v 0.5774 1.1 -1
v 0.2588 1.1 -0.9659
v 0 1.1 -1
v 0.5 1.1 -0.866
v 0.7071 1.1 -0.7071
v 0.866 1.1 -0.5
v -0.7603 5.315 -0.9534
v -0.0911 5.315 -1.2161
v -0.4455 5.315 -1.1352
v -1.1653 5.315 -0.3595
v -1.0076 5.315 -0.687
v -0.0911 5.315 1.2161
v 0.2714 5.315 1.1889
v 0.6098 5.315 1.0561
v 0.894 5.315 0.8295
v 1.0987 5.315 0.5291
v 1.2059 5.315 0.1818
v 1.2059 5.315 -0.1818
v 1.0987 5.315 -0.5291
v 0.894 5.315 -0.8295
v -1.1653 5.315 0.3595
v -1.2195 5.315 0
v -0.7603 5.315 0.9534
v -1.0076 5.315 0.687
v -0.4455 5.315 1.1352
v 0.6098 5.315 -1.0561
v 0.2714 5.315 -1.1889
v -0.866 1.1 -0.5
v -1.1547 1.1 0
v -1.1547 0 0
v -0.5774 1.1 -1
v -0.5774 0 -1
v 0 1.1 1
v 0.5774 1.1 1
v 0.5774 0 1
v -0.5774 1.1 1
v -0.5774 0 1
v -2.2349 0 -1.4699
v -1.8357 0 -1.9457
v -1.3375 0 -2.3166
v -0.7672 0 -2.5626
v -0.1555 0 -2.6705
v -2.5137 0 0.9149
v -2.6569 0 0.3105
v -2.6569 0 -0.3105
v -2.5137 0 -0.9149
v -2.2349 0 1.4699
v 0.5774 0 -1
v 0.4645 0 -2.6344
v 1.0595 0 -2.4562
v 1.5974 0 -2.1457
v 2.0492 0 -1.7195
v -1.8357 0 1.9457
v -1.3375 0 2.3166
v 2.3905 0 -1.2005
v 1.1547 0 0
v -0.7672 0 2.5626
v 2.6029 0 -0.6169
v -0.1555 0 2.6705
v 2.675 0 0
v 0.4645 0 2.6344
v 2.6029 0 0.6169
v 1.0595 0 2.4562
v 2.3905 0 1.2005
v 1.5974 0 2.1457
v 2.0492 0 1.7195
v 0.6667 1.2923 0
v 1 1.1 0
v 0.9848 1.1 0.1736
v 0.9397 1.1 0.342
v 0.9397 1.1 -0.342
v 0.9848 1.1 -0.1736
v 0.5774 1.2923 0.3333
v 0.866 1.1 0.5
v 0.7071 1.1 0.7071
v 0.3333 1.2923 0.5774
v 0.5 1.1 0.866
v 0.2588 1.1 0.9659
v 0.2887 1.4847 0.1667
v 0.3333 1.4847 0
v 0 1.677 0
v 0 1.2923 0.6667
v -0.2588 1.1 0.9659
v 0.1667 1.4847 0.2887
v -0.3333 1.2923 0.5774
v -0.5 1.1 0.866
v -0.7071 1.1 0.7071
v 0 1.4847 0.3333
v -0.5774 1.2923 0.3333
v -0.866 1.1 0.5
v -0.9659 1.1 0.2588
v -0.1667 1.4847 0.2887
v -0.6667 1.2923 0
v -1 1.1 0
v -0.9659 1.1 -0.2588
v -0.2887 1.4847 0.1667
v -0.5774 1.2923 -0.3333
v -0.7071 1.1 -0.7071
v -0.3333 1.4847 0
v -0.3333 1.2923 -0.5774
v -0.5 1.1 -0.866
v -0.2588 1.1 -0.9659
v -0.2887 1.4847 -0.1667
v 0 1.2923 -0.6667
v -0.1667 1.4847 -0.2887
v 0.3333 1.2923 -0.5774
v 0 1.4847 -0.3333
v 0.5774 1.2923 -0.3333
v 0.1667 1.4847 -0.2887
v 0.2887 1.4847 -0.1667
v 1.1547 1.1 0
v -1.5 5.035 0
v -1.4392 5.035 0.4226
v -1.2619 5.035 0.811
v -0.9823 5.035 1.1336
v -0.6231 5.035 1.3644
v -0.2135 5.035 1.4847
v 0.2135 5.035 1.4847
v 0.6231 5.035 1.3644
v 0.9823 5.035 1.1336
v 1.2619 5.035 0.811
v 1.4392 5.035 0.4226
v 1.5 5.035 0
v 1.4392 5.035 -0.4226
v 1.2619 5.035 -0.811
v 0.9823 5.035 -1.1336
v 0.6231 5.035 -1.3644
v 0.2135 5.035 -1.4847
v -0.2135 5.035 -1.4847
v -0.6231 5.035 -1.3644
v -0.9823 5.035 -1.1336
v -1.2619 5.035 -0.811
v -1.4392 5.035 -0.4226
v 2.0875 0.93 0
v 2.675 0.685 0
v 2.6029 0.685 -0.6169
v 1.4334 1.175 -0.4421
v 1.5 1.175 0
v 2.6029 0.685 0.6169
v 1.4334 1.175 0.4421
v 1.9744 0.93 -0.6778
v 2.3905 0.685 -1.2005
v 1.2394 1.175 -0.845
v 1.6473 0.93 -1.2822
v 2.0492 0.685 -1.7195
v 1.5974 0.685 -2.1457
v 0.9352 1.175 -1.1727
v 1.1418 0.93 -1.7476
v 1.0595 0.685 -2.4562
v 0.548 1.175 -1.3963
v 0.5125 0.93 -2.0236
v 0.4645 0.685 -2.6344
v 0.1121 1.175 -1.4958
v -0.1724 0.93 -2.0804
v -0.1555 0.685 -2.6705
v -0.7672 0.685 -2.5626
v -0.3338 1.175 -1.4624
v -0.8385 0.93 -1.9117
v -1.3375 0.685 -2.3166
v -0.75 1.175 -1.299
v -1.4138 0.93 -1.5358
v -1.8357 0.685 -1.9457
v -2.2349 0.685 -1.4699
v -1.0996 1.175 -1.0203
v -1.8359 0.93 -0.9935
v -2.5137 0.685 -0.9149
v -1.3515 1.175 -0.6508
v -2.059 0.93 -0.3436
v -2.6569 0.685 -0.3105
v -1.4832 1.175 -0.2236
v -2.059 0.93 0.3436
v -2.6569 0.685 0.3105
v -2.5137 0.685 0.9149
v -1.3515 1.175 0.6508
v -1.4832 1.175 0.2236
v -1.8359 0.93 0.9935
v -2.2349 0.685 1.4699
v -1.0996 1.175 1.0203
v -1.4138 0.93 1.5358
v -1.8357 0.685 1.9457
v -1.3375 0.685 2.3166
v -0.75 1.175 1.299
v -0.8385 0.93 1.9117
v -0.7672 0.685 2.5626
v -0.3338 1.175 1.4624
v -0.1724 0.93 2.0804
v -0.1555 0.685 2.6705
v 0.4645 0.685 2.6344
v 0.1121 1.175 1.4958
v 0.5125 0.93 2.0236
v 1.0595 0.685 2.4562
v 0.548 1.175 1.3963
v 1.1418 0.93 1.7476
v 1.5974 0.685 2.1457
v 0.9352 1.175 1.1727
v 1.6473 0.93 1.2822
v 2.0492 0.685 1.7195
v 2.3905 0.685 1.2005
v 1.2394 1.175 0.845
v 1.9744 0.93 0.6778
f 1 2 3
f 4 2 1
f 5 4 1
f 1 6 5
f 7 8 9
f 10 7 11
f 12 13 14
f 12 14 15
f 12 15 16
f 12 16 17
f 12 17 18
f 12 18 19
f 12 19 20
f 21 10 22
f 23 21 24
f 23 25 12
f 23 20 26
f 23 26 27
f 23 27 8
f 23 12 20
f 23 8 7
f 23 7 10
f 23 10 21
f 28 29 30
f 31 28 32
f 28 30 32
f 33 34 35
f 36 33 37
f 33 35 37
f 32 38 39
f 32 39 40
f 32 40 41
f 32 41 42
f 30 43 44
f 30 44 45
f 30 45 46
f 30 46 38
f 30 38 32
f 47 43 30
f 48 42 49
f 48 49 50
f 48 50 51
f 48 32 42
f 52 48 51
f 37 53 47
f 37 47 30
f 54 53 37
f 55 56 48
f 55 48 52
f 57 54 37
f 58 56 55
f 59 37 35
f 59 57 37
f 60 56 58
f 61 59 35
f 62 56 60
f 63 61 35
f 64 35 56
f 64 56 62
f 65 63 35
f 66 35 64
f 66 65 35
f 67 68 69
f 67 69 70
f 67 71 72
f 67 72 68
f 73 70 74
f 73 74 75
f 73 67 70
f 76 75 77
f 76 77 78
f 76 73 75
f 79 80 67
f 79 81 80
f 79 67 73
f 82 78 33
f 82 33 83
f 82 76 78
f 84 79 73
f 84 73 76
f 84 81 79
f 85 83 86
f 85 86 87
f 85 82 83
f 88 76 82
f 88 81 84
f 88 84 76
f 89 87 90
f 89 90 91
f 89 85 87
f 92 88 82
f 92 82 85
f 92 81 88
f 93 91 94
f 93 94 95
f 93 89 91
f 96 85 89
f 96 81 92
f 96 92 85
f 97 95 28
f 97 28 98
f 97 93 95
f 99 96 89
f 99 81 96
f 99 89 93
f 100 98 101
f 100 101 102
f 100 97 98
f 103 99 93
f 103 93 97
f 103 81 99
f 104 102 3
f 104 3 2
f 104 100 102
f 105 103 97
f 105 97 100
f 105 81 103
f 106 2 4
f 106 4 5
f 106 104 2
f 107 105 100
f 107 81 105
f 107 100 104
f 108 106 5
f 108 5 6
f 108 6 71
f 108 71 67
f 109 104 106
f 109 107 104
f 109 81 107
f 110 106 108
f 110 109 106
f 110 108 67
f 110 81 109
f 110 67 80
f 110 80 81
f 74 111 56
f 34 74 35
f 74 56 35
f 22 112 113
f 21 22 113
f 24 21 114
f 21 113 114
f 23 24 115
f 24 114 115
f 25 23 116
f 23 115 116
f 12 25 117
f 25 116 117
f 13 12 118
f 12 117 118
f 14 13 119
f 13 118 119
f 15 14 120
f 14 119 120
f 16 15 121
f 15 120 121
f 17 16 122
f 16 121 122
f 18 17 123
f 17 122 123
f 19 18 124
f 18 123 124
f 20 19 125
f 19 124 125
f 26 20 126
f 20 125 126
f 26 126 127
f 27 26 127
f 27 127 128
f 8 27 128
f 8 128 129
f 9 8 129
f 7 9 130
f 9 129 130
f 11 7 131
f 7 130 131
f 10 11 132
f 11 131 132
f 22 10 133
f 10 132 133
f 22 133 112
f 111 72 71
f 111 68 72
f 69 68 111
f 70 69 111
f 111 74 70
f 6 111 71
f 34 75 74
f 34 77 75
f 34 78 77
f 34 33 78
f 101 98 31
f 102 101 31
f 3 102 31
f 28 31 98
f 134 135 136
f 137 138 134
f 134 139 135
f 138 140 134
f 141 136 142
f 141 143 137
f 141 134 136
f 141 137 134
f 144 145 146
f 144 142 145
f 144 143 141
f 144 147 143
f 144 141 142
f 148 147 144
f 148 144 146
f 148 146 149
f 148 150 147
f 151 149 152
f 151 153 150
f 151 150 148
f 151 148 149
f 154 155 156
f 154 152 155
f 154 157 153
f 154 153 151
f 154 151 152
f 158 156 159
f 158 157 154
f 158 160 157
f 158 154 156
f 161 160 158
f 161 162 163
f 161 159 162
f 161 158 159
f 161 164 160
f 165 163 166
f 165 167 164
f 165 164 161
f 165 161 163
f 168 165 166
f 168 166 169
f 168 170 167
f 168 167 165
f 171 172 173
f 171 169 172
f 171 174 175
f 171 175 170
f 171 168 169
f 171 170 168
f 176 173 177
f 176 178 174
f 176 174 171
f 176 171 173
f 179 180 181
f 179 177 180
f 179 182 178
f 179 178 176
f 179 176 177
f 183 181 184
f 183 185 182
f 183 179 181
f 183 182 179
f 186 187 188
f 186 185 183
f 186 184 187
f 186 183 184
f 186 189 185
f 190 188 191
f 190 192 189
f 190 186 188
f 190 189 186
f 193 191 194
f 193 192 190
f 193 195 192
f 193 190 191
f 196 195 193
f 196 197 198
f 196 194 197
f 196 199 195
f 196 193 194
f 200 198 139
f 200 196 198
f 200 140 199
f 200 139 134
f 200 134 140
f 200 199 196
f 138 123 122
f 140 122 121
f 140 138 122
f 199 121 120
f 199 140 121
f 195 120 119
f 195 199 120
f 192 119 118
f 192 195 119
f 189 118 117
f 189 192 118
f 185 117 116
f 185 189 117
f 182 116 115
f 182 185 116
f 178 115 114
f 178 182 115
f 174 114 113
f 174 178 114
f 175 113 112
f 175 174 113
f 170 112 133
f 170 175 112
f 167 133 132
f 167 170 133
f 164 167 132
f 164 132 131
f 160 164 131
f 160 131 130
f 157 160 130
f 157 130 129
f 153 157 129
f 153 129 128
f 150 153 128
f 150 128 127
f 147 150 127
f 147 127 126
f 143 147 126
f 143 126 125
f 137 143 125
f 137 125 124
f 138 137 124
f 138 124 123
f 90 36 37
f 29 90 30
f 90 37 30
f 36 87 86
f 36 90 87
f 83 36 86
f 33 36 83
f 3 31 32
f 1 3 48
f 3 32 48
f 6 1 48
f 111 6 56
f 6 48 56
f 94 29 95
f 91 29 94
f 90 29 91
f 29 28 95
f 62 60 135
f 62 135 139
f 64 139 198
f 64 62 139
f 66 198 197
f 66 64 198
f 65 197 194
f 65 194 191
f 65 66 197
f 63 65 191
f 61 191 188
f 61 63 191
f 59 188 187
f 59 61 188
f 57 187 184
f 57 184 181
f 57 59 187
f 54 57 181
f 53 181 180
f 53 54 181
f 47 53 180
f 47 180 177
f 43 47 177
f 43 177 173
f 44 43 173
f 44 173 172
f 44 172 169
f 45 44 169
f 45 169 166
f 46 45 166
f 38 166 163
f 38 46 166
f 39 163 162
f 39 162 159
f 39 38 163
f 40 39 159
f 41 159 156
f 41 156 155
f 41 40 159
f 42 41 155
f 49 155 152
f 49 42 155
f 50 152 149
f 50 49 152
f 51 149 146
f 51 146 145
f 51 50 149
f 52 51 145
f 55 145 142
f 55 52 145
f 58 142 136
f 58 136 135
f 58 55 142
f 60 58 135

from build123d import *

# Parameters (mm, degrees)
F0_R      = 2.675
F1_DEPTH  = 0.685
F1_FACE_R = 2.675
F3_R      = 1.5
F5_DEPTH  = 3.86
F7_R      = 1.2195
F5_FACE_R = 1.5
F9_DEPTH  = 1.1
F11_R     = 1


with BuildPart() as f1:
    # F0 (on Front) → F1 (new body)
    with BuildSketch(Plane.XZ):
        Circle(F0_R)
        Polygon((-1.1547005384, 0), (-0.5773502692, 1), (0.5773502692, 1), (1.1547005384, 0), (0.5773502692, -1), (-0.5773502692, -1), align=None, mode=Mode.SUBTRACT)
        Polygon((0.5773502692, 1), (-0.5773502692, 1), (-1.1547005384, 0), (-0.5773502692, -1), (0.5773502692, -1), (1.1547005384, 0), align=None)
    extrude(amount=-F1_DEPTH)

    # F1_face (on face) → F4 section 0
    with BuildSketch(Plane(origin=(0, 0.685, 0), x_dir=(1, 0, 0), z_dir=(0, 1, 0))):
        Circle(F1_FACE_R)
    # F3 (on offset) → F4 section 1
    with BuildSketch(Plane.XZ.offset(-1.175)):
        Circle(F3_R)
    loft()

    # F5 (add): a face of the model
    f5_faces = [f1.faces().sort_by_distance(p)[0] for p in [
        (0, 1.175, 0),
    ]]
    extrude(f5_faces, amount=F5_DEPTH)

    # F7 (on offset) → F8 section 0
    with BuildSketch(Plane(origin=(0, 5.315, 0), x_dir=(-1, 0, 0), z_dir=(0, 1, 0))):
        Circle(F7_R)
    # F5_face (on face) → F8 section 1
    with BuildSketch(Plane(origin=(0, 5.035, 0), x_dir=(-1, 0, 0), z_dir=(0, 1, 0))):
        Circle(F5_FACE_R)
    loft()

    # F0 (on Front) → F9 (cut)
    with BuildSketch(Plane.XZ):
        Polygon((0.5773502692, 1), (-0.5773502692, 1), (-1.1547005384, 0), (-0.5773502692, -1), (0.5773502692, -1), (1.1547005384, 0), align=None)
    extrude(amount=-F9_DEPTH, mode=Mode.SUBTRACT)

    # F11 (on offset) → F14 section 0
    with BuildSketch(Plane.XZ.offset(-1.1), mode=Mode.PRIVATE) as f14_s0:
        Circle(F11_R)
    loft([f14_s0.sketch, Vertex(0, 1.677, 0)], mode=Mode.SUBTRACT)


solid = f1.part
